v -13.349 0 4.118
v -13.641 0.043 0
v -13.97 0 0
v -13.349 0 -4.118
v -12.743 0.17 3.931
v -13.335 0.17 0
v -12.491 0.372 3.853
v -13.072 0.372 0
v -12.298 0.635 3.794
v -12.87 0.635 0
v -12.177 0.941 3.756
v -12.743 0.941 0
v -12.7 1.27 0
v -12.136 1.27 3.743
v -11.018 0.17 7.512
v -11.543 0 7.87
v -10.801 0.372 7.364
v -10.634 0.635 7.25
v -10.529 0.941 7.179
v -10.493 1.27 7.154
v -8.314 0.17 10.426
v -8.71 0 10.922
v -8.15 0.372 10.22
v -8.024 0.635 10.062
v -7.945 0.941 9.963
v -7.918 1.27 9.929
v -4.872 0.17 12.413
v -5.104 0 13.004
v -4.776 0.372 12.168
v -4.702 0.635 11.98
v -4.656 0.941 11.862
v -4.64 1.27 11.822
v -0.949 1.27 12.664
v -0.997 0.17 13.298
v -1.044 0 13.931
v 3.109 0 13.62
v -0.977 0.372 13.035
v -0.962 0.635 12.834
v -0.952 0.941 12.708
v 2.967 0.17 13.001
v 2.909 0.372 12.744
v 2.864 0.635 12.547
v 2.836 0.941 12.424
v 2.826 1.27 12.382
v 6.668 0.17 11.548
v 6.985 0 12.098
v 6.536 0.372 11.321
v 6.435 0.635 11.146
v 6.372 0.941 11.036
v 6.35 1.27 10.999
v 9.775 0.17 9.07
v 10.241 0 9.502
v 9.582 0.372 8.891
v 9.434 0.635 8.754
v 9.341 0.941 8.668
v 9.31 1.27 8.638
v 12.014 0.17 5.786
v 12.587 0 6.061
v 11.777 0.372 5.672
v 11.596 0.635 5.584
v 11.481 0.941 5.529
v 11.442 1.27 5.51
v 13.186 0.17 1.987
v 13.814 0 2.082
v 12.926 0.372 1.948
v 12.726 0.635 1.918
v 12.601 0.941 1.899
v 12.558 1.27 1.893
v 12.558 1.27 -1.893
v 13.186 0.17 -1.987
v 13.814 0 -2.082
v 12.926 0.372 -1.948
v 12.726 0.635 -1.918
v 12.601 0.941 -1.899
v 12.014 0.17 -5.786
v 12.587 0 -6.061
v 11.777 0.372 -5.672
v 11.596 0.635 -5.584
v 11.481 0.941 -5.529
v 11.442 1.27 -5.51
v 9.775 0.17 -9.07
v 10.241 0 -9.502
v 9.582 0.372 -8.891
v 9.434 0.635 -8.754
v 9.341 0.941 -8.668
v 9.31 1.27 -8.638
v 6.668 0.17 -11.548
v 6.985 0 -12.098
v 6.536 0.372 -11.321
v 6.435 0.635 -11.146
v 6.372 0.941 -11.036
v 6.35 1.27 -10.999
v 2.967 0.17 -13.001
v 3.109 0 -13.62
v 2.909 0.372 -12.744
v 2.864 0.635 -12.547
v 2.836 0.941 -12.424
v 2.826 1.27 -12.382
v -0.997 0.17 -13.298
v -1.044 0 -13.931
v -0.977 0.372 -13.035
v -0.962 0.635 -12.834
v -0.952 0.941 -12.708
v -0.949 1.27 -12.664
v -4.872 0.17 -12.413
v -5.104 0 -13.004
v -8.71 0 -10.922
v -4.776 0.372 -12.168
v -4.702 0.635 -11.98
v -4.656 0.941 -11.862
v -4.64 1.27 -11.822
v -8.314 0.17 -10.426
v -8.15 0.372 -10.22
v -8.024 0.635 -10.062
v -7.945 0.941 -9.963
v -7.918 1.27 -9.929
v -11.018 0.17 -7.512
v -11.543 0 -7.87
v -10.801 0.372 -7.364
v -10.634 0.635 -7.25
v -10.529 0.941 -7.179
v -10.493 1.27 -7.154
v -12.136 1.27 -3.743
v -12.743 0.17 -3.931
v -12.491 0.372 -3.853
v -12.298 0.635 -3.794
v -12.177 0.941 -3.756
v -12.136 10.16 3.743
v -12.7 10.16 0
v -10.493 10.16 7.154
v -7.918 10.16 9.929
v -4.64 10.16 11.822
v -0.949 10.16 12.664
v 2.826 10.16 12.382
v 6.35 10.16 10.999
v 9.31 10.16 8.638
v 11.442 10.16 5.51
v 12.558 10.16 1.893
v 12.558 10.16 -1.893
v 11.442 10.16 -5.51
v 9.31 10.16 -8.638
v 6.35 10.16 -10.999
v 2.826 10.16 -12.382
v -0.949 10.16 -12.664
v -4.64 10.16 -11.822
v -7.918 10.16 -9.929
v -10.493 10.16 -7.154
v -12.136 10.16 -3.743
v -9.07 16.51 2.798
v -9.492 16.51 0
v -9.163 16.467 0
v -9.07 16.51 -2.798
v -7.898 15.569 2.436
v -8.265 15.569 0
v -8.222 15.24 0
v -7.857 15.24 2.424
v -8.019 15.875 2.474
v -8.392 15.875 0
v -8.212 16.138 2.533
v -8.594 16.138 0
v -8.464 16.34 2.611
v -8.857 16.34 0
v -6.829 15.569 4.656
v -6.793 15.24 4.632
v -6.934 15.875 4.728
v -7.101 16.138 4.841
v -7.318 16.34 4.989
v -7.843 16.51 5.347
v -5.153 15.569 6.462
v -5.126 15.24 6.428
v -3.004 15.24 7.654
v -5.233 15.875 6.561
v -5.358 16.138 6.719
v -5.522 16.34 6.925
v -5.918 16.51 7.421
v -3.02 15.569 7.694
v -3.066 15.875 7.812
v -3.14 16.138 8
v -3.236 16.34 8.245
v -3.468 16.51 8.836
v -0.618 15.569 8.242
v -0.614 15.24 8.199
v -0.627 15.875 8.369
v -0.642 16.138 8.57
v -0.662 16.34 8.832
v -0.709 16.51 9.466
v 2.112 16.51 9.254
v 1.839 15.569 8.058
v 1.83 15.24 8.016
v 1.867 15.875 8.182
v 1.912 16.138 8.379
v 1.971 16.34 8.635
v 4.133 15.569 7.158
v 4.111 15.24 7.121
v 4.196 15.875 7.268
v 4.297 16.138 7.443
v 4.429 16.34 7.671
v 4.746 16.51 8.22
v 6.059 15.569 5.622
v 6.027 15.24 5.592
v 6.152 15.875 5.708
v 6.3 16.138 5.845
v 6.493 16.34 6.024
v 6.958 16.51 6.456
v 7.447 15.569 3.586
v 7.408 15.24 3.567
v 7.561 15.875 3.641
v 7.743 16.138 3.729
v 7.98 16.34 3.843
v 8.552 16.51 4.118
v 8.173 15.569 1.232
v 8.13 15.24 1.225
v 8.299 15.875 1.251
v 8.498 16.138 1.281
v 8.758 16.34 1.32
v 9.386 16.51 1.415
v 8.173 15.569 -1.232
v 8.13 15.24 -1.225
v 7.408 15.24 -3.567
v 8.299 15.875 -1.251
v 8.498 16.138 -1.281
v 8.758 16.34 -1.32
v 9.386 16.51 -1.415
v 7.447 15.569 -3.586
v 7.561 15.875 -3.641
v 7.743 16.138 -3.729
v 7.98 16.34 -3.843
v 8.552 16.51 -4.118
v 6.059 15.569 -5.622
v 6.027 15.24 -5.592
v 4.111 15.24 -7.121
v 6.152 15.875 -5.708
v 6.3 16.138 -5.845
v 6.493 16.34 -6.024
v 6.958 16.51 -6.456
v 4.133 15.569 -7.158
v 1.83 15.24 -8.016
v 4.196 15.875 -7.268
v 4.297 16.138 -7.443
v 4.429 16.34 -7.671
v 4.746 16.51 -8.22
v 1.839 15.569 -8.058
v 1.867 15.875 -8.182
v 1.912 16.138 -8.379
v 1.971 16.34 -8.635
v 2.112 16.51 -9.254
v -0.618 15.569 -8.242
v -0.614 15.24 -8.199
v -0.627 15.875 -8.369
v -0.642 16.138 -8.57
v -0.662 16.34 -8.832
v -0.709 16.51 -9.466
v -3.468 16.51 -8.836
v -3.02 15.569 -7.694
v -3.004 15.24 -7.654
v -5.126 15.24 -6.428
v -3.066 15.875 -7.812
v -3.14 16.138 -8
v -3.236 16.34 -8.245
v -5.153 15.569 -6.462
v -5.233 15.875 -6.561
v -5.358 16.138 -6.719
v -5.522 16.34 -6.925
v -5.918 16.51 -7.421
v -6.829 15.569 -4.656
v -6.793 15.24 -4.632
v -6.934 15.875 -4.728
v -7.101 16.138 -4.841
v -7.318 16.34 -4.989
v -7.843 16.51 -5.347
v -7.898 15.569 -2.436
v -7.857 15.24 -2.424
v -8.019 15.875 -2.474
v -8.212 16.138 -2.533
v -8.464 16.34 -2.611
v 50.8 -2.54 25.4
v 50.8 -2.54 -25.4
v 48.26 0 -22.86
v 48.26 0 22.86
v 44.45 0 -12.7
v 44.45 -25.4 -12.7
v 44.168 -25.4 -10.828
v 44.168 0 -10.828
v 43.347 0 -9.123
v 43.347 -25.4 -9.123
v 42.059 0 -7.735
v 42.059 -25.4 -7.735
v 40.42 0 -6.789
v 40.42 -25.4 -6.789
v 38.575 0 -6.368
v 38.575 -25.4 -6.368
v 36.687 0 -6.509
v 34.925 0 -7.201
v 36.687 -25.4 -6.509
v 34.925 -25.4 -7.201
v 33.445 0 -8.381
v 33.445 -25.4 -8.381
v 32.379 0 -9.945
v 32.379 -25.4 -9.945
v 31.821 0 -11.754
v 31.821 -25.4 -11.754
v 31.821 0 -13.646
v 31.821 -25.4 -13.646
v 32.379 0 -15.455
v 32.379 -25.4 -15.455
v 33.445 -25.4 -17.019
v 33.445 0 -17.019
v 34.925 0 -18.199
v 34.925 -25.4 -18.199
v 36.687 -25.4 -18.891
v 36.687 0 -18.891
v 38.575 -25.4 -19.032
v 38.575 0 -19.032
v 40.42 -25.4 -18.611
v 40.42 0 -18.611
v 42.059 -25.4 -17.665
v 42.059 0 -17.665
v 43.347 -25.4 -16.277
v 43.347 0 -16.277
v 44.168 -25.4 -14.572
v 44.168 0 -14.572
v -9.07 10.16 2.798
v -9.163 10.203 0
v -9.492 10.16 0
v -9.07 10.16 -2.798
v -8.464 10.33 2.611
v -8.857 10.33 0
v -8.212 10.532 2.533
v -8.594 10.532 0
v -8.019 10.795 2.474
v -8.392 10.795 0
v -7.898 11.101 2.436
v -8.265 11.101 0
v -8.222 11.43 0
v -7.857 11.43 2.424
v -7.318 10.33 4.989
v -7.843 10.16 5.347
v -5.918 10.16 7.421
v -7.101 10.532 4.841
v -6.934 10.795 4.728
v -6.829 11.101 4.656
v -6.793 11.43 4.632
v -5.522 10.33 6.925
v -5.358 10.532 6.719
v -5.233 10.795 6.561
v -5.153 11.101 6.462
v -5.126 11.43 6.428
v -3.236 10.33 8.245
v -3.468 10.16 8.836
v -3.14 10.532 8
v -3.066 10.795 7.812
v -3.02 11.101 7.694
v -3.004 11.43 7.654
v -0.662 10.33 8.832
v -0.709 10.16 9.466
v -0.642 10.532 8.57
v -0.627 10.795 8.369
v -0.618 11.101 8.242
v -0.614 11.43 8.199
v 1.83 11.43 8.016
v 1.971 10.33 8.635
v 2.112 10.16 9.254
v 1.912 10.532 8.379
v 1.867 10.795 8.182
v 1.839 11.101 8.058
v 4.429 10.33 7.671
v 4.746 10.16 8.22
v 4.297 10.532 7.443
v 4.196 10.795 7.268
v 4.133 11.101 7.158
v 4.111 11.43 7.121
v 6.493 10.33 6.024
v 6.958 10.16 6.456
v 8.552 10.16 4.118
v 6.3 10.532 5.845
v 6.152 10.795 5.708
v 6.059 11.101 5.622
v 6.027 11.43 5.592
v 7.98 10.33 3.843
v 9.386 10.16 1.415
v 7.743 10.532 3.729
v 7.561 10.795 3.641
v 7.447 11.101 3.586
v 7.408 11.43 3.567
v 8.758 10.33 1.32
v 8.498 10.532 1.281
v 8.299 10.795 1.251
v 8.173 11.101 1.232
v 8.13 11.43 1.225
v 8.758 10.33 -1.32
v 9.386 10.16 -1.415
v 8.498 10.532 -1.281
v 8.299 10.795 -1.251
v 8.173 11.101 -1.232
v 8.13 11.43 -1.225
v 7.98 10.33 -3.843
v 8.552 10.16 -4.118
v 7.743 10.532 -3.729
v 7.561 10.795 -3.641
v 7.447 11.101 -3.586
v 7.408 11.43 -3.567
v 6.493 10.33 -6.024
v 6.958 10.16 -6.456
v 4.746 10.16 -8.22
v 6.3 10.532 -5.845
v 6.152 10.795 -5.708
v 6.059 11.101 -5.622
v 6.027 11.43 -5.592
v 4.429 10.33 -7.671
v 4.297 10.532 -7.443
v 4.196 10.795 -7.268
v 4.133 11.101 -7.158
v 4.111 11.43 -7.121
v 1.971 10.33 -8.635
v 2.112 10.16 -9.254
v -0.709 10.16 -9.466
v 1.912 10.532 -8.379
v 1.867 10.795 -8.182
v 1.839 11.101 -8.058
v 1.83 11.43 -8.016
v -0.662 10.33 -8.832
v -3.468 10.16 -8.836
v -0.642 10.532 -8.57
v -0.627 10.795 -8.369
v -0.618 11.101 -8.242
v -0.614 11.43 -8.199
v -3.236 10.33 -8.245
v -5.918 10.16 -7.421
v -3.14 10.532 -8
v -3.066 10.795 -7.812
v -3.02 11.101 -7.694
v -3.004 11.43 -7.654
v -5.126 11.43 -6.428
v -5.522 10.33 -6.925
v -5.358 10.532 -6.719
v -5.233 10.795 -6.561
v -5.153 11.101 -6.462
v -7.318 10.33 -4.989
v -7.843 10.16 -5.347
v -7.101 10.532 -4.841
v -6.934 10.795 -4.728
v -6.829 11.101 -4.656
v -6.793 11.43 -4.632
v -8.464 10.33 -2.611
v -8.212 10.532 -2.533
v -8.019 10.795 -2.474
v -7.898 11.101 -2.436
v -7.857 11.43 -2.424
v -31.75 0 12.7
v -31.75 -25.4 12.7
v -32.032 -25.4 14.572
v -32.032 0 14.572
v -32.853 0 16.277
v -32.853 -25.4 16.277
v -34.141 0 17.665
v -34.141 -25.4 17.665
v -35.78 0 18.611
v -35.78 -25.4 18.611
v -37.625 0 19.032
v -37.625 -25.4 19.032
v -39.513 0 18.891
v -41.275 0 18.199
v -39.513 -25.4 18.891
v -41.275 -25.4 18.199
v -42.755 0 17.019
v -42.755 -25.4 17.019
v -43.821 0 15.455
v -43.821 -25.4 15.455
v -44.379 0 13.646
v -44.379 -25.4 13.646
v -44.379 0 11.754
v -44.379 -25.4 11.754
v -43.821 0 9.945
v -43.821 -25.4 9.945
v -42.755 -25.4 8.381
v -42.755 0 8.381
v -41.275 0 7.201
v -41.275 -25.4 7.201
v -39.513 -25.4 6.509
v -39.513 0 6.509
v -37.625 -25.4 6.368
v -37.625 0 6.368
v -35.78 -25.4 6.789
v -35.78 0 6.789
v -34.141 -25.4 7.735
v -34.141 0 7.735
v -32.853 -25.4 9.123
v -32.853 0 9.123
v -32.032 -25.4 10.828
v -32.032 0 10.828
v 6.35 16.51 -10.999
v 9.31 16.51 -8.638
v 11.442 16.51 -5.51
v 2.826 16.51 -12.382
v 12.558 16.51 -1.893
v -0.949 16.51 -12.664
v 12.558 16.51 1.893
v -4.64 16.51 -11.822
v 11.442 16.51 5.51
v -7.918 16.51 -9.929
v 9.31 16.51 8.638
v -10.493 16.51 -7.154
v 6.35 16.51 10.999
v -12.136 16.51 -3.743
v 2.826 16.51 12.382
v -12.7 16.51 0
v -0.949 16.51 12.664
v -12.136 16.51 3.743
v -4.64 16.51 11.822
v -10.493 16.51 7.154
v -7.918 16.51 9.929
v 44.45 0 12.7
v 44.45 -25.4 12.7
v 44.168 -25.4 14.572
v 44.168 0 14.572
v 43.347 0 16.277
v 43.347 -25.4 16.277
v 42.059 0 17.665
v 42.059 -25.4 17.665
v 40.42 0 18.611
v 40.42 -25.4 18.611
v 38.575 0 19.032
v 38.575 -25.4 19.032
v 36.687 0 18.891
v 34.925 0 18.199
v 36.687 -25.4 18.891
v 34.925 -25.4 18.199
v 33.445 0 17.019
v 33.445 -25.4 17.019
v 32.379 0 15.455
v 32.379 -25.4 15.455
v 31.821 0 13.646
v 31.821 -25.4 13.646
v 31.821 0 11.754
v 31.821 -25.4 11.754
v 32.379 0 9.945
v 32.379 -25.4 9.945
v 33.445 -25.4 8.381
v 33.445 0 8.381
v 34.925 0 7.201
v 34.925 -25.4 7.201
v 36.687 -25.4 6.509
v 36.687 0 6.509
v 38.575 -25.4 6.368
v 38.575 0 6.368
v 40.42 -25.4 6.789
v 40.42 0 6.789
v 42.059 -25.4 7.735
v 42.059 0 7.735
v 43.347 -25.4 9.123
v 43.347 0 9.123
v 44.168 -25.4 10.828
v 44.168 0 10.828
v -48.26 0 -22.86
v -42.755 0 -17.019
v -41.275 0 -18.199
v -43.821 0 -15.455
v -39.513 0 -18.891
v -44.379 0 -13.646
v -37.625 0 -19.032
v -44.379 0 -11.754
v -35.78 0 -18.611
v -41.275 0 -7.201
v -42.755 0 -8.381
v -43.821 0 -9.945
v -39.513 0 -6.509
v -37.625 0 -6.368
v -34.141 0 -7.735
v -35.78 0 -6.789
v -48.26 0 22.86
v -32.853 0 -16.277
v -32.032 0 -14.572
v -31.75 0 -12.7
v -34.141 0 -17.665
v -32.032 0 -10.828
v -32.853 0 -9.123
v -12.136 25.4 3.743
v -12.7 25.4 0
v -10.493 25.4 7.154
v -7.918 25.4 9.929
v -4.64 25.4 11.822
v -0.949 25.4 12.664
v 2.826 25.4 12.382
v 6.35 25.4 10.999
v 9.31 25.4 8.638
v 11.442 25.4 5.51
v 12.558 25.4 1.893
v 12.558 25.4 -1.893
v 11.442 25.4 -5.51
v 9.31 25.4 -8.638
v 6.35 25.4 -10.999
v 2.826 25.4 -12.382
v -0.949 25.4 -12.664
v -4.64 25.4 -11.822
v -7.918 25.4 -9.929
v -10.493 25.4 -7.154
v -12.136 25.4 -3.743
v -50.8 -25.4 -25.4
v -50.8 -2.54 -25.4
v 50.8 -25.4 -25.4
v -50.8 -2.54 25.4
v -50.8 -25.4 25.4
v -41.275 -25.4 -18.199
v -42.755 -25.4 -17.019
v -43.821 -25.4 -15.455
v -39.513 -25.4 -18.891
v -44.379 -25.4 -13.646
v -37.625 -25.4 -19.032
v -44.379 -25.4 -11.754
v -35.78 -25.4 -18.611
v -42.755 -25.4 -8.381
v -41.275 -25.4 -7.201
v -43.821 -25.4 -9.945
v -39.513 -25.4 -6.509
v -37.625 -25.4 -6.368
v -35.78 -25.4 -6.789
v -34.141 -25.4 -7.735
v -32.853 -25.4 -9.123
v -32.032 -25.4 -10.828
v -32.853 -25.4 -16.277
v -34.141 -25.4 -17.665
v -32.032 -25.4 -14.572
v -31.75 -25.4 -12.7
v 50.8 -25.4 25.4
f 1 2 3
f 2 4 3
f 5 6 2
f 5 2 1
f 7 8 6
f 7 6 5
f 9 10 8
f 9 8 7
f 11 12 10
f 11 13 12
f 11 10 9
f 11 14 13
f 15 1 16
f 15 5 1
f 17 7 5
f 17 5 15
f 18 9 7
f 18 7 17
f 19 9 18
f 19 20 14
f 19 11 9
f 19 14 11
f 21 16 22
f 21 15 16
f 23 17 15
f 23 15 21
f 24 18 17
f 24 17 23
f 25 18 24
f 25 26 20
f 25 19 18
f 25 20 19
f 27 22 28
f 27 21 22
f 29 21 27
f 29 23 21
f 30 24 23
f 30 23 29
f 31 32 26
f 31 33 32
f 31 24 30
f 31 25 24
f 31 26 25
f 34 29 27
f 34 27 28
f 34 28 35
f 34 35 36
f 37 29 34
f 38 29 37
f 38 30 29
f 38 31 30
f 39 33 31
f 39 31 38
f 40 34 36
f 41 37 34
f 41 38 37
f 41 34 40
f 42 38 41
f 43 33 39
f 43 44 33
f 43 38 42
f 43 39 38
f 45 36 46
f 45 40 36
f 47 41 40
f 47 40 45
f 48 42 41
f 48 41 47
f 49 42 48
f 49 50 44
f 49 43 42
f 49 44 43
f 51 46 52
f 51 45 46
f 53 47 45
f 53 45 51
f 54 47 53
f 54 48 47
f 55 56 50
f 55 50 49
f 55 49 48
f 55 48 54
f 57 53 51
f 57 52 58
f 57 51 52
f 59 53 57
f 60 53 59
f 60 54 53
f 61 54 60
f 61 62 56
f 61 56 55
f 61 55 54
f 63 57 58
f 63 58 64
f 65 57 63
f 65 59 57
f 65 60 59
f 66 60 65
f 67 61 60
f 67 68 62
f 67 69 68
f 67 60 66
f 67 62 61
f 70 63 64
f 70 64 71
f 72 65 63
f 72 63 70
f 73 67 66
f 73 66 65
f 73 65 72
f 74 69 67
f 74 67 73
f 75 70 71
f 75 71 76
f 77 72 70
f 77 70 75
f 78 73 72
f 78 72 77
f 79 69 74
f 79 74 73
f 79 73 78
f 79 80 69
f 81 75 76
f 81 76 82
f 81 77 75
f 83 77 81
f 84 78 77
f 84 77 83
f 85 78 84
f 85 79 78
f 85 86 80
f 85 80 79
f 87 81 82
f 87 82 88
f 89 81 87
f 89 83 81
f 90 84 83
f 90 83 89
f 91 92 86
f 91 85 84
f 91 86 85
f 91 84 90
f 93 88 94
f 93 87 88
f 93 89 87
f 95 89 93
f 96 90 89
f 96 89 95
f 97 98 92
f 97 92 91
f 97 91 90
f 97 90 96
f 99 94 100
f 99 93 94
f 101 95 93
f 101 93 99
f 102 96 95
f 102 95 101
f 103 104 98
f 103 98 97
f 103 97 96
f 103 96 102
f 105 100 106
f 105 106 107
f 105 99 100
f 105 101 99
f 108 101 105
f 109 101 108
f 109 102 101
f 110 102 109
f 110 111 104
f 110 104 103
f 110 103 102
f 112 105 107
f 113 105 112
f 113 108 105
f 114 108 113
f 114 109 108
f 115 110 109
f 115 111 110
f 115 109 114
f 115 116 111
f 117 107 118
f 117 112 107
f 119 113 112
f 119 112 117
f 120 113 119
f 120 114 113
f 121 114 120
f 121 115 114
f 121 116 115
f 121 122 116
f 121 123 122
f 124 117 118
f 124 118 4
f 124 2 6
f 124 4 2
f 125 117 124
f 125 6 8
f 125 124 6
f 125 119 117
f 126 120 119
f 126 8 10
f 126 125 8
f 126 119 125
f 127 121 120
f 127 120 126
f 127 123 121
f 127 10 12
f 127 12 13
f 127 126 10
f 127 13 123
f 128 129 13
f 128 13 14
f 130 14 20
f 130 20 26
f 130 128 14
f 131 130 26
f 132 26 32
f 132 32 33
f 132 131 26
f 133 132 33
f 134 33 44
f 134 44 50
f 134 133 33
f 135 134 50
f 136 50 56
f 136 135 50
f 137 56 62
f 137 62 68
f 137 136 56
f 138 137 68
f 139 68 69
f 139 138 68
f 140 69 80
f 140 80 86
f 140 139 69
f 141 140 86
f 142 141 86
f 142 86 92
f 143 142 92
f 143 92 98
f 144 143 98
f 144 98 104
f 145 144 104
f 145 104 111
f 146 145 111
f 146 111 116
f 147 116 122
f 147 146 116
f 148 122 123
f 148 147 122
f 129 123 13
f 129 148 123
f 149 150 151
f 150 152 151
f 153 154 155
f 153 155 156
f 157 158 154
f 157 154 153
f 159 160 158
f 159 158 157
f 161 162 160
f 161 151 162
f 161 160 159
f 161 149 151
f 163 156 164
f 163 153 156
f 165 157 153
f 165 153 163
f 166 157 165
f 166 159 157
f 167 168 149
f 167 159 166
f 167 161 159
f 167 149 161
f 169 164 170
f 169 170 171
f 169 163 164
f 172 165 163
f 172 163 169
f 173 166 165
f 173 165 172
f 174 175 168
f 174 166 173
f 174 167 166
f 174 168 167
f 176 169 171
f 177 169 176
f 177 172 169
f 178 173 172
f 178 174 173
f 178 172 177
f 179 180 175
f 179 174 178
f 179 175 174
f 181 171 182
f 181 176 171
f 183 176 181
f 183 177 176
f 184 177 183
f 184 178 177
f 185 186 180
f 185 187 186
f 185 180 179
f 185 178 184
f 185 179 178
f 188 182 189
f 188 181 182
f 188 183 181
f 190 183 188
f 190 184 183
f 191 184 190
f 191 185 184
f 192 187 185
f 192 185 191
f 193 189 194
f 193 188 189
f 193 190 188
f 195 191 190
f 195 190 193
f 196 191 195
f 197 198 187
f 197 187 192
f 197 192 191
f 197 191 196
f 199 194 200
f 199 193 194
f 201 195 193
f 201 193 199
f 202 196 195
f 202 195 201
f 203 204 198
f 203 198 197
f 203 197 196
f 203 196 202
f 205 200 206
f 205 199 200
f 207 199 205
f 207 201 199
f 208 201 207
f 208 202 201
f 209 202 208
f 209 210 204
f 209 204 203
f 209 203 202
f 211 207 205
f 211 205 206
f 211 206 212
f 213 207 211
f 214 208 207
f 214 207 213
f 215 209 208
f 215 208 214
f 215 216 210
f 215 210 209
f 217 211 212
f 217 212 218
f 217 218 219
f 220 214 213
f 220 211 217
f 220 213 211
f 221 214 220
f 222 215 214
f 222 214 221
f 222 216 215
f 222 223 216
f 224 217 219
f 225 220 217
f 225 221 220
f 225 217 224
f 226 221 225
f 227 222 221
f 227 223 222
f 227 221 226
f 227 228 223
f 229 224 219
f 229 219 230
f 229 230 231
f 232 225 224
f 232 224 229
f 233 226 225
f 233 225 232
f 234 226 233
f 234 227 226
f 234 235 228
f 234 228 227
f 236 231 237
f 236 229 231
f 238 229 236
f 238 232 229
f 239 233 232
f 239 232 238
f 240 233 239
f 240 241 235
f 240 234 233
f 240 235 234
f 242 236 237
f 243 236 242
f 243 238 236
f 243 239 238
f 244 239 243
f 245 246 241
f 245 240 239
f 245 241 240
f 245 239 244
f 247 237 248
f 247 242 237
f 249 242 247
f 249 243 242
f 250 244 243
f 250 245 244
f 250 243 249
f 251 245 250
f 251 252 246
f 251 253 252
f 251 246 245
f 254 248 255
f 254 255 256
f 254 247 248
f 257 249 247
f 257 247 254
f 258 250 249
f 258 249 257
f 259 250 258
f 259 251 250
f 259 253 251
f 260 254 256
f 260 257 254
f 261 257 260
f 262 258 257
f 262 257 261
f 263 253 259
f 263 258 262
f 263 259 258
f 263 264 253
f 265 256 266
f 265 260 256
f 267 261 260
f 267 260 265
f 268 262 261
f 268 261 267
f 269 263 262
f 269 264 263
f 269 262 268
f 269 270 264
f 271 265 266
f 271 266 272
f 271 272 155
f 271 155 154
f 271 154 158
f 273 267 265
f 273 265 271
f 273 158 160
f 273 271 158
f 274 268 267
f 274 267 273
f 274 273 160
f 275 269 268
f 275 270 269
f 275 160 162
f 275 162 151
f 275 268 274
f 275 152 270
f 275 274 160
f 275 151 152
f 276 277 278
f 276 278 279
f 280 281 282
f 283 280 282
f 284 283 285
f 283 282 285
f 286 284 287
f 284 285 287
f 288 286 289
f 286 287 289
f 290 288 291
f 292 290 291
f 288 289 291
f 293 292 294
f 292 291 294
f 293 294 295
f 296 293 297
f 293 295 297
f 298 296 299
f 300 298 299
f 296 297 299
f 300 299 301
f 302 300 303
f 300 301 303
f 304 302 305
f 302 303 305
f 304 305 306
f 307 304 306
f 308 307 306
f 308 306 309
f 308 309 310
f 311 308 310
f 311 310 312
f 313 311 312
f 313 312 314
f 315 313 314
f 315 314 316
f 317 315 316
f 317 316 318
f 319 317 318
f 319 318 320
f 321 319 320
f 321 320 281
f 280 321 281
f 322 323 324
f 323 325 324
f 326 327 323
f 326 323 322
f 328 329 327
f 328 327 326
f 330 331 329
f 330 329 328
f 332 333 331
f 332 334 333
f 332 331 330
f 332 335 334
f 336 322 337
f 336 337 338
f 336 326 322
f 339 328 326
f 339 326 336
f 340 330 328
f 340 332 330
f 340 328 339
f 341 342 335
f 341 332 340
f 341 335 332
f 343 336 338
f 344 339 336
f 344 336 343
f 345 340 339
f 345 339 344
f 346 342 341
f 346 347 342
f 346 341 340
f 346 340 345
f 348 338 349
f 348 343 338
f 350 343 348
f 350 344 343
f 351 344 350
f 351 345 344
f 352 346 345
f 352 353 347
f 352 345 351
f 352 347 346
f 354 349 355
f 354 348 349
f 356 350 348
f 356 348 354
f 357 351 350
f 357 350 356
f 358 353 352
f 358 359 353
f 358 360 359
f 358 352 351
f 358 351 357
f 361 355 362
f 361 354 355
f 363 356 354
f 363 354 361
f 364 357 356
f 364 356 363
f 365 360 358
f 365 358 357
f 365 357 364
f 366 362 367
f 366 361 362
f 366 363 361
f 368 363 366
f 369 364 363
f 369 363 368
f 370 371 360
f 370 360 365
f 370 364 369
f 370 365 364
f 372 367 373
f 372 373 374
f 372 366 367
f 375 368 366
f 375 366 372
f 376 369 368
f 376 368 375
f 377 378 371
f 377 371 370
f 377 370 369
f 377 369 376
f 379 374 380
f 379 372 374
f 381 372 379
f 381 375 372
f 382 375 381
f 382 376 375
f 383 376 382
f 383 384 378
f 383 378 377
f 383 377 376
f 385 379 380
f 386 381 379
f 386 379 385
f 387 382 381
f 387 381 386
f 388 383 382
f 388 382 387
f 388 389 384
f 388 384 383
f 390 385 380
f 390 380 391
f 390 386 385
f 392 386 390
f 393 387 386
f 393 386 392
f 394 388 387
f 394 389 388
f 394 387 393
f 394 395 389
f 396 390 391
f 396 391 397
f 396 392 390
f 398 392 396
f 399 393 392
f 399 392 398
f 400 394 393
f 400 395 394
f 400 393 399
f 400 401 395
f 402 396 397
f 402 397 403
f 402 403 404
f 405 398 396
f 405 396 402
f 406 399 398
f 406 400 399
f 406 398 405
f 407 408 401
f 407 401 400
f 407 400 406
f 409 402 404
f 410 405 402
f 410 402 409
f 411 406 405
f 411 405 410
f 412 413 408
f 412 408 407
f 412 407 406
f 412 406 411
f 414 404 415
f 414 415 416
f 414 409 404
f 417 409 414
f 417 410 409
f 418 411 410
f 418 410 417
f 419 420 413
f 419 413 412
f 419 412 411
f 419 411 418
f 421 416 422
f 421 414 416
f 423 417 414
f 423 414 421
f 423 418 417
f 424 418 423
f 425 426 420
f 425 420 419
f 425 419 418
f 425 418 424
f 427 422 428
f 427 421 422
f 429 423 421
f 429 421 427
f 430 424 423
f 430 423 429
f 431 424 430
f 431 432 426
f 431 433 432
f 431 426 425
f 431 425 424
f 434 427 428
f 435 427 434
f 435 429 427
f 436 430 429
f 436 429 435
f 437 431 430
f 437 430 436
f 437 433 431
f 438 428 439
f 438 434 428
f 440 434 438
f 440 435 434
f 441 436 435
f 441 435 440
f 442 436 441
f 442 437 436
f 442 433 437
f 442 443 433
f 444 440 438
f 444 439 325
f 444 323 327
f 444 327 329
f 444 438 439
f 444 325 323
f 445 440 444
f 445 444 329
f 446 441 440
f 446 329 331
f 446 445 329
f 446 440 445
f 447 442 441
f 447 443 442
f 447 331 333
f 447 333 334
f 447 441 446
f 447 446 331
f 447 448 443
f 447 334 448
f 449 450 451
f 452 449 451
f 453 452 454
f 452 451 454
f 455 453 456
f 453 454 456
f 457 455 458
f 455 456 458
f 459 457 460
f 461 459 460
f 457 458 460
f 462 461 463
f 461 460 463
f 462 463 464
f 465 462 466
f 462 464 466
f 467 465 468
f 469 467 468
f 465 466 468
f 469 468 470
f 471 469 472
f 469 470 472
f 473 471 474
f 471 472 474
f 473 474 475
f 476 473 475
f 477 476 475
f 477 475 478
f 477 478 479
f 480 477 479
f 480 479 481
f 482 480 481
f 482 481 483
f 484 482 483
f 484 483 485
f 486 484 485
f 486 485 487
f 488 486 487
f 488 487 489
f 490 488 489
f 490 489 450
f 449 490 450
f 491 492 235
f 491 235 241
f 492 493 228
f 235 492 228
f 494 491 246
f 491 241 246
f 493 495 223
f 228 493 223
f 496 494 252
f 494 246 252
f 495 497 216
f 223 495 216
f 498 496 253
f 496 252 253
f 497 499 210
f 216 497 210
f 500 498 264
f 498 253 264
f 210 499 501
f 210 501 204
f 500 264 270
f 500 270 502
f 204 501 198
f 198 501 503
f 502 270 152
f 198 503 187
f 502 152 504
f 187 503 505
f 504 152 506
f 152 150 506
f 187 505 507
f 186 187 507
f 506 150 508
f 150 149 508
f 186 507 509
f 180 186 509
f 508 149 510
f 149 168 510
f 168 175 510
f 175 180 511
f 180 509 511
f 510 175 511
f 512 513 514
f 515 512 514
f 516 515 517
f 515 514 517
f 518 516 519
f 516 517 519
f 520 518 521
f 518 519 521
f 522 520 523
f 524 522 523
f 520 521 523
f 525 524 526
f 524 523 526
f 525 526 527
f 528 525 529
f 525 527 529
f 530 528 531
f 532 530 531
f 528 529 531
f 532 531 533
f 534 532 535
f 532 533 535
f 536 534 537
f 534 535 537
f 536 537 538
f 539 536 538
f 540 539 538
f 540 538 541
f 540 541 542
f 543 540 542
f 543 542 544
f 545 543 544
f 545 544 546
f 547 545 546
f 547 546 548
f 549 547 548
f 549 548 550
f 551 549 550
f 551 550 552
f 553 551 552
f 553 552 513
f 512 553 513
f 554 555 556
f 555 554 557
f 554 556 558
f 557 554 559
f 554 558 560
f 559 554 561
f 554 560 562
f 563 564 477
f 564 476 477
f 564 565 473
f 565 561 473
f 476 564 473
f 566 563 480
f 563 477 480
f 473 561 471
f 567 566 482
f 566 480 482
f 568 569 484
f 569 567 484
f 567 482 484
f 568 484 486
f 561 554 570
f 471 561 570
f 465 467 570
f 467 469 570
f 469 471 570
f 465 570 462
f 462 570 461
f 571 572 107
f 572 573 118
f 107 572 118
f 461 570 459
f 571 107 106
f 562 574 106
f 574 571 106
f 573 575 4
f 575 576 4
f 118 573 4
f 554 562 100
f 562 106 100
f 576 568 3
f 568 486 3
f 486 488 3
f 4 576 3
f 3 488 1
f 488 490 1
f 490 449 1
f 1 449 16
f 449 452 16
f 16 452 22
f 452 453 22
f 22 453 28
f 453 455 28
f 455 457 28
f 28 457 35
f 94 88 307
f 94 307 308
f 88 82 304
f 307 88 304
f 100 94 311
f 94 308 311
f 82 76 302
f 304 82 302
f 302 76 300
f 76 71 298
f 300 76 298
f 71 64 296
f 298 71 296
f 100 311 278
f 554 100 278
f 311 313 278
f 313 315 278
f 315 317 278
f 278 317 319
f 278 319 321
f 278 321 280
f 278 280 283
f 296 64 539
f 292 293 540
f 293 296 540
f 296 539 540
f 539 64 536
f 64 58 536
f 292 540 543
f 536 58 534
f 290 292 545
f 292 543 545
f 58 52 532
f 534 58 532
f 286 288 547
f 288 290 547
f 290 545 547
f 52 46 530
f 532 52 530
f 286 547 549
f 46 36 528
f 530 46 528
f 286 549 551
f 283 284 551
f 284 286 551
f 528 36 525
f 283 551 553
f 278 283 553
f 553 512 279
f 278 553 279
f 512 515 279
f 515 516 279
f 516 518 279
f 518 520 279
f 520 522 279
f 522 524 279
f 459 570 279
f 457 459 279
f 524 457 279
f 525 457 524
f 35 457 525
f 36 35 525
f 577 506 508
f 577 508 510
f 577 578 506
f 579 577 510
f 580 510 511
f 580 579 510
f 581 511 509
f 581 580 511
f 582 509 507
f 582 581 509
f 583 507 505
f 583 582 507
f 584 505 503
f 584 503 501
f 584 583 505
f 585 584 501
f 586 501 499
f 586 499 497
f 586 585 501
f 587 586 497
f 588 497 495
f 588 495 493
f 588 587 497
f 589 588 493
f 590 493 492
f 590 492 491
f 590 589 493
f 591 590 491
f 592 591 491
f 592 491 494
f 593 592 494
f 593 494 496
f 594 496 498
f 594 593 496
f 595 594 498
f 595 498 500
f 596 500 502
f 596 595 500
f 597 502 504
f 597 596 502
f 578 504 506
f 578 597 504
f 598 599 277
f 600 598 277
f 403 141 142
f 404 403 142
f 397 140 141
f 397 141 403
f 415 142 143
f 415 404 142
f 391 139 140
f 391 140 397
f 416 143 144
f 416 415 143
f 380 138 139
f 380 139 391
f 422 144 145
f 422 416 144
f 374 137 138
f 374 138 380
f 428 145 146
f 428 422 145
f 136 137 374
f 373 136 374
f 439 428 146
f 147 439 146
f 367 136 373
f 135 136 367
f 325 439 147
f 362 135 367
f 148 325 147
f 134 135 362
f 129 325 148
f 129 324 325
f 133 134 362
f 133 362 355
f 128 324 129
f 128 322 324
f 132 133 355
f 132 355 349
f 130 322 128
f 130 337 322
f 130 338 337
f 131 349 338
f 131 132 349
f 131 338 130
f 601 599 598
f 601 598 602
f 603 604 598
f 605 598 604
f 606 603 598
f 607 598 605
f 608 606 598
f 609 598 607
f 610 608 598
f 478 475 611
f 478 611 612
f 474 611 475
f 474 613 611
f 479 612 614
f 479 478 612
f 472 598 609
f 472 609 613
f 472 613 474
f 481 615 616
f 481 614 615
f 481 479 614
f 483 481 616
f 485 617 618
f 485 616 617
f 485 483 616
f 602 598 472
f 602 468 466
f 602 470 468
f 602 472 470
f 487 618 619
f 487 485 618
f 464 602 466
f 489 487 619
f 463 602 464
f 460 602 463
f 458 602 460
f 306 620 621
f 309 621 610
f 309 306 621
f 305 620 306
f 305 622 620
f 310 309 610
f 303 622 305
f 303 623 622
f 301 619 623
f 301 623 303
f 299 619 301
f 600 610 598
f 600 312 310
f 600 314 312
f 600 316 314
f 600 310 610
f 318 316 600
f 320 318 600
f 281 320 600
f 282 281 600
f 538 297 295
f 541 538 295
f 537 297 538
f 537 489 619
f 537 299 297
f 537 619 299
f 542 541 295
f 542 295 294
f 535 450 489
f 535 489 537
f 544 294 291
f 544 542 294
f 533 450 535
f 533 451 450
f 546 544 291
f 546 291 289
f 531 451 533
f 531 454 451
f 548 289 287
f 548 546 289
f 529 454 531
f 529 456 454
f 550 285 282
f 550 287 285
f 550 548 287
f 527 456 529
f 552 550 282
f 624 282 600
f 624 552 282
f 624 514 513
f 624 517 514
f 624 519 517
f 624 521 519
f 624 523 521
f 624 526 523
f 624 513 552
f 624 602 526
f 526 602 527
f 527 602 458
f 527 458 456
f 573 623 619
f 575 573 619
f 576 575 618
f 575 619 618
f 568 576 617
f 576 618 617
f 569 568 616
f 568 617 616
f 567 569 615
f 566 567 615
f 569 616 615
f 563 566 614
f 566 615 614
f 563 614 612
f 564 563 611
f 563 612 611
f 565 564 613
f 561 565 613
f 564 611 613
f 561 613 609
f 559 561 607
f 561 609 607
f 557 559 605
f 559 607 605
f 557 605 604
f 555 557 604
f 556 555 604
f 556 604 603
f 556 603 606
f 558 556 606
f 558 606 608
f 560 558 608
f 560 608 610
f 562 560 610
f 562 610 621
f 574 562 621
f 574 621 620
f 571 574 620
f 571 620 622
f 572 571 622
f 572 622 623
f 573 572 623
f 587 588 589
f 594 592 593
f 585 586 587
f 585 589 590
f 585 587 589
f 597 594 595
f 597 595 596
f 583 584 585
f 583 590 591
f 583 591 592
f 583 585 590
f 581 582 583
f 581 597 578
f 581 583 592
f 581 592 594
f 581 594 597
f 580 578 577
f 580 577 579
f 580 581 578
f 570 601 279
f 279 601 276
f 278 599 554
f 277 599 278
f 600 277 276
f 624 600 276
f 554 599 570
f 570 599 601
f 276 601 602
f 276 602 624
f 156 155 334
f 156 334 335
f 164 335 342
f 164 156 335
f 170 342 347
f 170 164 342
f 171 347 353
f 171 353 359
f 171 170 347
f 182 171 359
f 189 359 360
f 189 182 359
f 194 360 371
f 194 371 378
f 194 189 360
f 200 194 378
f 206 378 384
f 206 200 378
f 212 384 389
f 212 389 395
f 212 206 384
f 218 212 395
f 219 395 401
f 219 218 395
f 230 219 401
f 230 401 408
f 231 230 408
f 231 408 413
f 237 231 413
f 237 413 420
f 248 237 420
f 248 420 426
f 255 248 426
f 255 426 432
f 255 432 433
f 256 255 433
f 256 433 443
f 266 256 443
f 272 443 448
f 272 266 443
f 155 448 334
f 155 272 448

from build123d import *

# Parameters (mm, degrees)
F0_W     = 101.6
F0_H     = 50.8
F1_DEPTH = 25.4
F2_R     = 6.35
F3_DEPTH = 25.401
F4_W     = 12.7
F4_H     = 25.4
F6_W     = 10.16
F6_H     = 6.35
F8_R     = 1.27
F9_SIZE  = 2.54


with BuildPart() as f1:
    # F0 (on Front) → F1 (new body)
    with BuildSketch(Plane.XZ):
        Rectangle(F0_W, F0_H)
    extrude(amount=F1_DEPTH)

    # F2 (on face) → F3 (cut, through all)
    with BuildSketch(Plane.XZ.offset(25.4)):
        with Locations((-38.1, 12.7)):
            Circle(F2_R)
        with Locations((-38.1, -12.7)):
            Circle(F2_R)
        with Locations((38.1, -12.7)):
            Circle(F2_R)
        with Locations((38.1, 12.7)):
            Circle(F2_R)
    extrude(amount=-F3_DEPTH, mode=Mode.SUBTRACT)

    # F4 (on Top) → F5 (revolve)
    with BuildSketch(Plane.XY):
        with Locations((-6.35, 12.7)):
            Rectangle(F4_W, F4_H)
    revolve(axis=Axis((0, 12.7, 0), (0, 1, 0)))

    # F6 (on Top) → F7 (revolve, cut)
    with BuildSketch(Plane.XY):
        with Locations((-13.302147, 13.335)):
            Rectangle(F6_W, F6_H)
    revolve(axis=Axis((0, 12.941601, 0), (0, 1, 0)), mode=Mode.SUBTRACT)

    # F8
    f8_edges = [f1.edges().sort_by_distance(p)[0] for p in [
        (12.7, 0, 0),
        (8.222147, 10.16, 0),
        (8.222147, 16.51, 0),
    ]]
    fillet(f8_edges, radius=F8_R)

    # F9
    f9_edges = [f1.edges().sort_by_distance(p)[0] for p in [
        (0, 0, -25.4),
        (-50.8, 0, 0),
        (0, 0, 25.4),
        (50.8, 0, 0),
    ]]
    chamfer(f9_edges, length=F9_SIZE)


solid = f1.part
